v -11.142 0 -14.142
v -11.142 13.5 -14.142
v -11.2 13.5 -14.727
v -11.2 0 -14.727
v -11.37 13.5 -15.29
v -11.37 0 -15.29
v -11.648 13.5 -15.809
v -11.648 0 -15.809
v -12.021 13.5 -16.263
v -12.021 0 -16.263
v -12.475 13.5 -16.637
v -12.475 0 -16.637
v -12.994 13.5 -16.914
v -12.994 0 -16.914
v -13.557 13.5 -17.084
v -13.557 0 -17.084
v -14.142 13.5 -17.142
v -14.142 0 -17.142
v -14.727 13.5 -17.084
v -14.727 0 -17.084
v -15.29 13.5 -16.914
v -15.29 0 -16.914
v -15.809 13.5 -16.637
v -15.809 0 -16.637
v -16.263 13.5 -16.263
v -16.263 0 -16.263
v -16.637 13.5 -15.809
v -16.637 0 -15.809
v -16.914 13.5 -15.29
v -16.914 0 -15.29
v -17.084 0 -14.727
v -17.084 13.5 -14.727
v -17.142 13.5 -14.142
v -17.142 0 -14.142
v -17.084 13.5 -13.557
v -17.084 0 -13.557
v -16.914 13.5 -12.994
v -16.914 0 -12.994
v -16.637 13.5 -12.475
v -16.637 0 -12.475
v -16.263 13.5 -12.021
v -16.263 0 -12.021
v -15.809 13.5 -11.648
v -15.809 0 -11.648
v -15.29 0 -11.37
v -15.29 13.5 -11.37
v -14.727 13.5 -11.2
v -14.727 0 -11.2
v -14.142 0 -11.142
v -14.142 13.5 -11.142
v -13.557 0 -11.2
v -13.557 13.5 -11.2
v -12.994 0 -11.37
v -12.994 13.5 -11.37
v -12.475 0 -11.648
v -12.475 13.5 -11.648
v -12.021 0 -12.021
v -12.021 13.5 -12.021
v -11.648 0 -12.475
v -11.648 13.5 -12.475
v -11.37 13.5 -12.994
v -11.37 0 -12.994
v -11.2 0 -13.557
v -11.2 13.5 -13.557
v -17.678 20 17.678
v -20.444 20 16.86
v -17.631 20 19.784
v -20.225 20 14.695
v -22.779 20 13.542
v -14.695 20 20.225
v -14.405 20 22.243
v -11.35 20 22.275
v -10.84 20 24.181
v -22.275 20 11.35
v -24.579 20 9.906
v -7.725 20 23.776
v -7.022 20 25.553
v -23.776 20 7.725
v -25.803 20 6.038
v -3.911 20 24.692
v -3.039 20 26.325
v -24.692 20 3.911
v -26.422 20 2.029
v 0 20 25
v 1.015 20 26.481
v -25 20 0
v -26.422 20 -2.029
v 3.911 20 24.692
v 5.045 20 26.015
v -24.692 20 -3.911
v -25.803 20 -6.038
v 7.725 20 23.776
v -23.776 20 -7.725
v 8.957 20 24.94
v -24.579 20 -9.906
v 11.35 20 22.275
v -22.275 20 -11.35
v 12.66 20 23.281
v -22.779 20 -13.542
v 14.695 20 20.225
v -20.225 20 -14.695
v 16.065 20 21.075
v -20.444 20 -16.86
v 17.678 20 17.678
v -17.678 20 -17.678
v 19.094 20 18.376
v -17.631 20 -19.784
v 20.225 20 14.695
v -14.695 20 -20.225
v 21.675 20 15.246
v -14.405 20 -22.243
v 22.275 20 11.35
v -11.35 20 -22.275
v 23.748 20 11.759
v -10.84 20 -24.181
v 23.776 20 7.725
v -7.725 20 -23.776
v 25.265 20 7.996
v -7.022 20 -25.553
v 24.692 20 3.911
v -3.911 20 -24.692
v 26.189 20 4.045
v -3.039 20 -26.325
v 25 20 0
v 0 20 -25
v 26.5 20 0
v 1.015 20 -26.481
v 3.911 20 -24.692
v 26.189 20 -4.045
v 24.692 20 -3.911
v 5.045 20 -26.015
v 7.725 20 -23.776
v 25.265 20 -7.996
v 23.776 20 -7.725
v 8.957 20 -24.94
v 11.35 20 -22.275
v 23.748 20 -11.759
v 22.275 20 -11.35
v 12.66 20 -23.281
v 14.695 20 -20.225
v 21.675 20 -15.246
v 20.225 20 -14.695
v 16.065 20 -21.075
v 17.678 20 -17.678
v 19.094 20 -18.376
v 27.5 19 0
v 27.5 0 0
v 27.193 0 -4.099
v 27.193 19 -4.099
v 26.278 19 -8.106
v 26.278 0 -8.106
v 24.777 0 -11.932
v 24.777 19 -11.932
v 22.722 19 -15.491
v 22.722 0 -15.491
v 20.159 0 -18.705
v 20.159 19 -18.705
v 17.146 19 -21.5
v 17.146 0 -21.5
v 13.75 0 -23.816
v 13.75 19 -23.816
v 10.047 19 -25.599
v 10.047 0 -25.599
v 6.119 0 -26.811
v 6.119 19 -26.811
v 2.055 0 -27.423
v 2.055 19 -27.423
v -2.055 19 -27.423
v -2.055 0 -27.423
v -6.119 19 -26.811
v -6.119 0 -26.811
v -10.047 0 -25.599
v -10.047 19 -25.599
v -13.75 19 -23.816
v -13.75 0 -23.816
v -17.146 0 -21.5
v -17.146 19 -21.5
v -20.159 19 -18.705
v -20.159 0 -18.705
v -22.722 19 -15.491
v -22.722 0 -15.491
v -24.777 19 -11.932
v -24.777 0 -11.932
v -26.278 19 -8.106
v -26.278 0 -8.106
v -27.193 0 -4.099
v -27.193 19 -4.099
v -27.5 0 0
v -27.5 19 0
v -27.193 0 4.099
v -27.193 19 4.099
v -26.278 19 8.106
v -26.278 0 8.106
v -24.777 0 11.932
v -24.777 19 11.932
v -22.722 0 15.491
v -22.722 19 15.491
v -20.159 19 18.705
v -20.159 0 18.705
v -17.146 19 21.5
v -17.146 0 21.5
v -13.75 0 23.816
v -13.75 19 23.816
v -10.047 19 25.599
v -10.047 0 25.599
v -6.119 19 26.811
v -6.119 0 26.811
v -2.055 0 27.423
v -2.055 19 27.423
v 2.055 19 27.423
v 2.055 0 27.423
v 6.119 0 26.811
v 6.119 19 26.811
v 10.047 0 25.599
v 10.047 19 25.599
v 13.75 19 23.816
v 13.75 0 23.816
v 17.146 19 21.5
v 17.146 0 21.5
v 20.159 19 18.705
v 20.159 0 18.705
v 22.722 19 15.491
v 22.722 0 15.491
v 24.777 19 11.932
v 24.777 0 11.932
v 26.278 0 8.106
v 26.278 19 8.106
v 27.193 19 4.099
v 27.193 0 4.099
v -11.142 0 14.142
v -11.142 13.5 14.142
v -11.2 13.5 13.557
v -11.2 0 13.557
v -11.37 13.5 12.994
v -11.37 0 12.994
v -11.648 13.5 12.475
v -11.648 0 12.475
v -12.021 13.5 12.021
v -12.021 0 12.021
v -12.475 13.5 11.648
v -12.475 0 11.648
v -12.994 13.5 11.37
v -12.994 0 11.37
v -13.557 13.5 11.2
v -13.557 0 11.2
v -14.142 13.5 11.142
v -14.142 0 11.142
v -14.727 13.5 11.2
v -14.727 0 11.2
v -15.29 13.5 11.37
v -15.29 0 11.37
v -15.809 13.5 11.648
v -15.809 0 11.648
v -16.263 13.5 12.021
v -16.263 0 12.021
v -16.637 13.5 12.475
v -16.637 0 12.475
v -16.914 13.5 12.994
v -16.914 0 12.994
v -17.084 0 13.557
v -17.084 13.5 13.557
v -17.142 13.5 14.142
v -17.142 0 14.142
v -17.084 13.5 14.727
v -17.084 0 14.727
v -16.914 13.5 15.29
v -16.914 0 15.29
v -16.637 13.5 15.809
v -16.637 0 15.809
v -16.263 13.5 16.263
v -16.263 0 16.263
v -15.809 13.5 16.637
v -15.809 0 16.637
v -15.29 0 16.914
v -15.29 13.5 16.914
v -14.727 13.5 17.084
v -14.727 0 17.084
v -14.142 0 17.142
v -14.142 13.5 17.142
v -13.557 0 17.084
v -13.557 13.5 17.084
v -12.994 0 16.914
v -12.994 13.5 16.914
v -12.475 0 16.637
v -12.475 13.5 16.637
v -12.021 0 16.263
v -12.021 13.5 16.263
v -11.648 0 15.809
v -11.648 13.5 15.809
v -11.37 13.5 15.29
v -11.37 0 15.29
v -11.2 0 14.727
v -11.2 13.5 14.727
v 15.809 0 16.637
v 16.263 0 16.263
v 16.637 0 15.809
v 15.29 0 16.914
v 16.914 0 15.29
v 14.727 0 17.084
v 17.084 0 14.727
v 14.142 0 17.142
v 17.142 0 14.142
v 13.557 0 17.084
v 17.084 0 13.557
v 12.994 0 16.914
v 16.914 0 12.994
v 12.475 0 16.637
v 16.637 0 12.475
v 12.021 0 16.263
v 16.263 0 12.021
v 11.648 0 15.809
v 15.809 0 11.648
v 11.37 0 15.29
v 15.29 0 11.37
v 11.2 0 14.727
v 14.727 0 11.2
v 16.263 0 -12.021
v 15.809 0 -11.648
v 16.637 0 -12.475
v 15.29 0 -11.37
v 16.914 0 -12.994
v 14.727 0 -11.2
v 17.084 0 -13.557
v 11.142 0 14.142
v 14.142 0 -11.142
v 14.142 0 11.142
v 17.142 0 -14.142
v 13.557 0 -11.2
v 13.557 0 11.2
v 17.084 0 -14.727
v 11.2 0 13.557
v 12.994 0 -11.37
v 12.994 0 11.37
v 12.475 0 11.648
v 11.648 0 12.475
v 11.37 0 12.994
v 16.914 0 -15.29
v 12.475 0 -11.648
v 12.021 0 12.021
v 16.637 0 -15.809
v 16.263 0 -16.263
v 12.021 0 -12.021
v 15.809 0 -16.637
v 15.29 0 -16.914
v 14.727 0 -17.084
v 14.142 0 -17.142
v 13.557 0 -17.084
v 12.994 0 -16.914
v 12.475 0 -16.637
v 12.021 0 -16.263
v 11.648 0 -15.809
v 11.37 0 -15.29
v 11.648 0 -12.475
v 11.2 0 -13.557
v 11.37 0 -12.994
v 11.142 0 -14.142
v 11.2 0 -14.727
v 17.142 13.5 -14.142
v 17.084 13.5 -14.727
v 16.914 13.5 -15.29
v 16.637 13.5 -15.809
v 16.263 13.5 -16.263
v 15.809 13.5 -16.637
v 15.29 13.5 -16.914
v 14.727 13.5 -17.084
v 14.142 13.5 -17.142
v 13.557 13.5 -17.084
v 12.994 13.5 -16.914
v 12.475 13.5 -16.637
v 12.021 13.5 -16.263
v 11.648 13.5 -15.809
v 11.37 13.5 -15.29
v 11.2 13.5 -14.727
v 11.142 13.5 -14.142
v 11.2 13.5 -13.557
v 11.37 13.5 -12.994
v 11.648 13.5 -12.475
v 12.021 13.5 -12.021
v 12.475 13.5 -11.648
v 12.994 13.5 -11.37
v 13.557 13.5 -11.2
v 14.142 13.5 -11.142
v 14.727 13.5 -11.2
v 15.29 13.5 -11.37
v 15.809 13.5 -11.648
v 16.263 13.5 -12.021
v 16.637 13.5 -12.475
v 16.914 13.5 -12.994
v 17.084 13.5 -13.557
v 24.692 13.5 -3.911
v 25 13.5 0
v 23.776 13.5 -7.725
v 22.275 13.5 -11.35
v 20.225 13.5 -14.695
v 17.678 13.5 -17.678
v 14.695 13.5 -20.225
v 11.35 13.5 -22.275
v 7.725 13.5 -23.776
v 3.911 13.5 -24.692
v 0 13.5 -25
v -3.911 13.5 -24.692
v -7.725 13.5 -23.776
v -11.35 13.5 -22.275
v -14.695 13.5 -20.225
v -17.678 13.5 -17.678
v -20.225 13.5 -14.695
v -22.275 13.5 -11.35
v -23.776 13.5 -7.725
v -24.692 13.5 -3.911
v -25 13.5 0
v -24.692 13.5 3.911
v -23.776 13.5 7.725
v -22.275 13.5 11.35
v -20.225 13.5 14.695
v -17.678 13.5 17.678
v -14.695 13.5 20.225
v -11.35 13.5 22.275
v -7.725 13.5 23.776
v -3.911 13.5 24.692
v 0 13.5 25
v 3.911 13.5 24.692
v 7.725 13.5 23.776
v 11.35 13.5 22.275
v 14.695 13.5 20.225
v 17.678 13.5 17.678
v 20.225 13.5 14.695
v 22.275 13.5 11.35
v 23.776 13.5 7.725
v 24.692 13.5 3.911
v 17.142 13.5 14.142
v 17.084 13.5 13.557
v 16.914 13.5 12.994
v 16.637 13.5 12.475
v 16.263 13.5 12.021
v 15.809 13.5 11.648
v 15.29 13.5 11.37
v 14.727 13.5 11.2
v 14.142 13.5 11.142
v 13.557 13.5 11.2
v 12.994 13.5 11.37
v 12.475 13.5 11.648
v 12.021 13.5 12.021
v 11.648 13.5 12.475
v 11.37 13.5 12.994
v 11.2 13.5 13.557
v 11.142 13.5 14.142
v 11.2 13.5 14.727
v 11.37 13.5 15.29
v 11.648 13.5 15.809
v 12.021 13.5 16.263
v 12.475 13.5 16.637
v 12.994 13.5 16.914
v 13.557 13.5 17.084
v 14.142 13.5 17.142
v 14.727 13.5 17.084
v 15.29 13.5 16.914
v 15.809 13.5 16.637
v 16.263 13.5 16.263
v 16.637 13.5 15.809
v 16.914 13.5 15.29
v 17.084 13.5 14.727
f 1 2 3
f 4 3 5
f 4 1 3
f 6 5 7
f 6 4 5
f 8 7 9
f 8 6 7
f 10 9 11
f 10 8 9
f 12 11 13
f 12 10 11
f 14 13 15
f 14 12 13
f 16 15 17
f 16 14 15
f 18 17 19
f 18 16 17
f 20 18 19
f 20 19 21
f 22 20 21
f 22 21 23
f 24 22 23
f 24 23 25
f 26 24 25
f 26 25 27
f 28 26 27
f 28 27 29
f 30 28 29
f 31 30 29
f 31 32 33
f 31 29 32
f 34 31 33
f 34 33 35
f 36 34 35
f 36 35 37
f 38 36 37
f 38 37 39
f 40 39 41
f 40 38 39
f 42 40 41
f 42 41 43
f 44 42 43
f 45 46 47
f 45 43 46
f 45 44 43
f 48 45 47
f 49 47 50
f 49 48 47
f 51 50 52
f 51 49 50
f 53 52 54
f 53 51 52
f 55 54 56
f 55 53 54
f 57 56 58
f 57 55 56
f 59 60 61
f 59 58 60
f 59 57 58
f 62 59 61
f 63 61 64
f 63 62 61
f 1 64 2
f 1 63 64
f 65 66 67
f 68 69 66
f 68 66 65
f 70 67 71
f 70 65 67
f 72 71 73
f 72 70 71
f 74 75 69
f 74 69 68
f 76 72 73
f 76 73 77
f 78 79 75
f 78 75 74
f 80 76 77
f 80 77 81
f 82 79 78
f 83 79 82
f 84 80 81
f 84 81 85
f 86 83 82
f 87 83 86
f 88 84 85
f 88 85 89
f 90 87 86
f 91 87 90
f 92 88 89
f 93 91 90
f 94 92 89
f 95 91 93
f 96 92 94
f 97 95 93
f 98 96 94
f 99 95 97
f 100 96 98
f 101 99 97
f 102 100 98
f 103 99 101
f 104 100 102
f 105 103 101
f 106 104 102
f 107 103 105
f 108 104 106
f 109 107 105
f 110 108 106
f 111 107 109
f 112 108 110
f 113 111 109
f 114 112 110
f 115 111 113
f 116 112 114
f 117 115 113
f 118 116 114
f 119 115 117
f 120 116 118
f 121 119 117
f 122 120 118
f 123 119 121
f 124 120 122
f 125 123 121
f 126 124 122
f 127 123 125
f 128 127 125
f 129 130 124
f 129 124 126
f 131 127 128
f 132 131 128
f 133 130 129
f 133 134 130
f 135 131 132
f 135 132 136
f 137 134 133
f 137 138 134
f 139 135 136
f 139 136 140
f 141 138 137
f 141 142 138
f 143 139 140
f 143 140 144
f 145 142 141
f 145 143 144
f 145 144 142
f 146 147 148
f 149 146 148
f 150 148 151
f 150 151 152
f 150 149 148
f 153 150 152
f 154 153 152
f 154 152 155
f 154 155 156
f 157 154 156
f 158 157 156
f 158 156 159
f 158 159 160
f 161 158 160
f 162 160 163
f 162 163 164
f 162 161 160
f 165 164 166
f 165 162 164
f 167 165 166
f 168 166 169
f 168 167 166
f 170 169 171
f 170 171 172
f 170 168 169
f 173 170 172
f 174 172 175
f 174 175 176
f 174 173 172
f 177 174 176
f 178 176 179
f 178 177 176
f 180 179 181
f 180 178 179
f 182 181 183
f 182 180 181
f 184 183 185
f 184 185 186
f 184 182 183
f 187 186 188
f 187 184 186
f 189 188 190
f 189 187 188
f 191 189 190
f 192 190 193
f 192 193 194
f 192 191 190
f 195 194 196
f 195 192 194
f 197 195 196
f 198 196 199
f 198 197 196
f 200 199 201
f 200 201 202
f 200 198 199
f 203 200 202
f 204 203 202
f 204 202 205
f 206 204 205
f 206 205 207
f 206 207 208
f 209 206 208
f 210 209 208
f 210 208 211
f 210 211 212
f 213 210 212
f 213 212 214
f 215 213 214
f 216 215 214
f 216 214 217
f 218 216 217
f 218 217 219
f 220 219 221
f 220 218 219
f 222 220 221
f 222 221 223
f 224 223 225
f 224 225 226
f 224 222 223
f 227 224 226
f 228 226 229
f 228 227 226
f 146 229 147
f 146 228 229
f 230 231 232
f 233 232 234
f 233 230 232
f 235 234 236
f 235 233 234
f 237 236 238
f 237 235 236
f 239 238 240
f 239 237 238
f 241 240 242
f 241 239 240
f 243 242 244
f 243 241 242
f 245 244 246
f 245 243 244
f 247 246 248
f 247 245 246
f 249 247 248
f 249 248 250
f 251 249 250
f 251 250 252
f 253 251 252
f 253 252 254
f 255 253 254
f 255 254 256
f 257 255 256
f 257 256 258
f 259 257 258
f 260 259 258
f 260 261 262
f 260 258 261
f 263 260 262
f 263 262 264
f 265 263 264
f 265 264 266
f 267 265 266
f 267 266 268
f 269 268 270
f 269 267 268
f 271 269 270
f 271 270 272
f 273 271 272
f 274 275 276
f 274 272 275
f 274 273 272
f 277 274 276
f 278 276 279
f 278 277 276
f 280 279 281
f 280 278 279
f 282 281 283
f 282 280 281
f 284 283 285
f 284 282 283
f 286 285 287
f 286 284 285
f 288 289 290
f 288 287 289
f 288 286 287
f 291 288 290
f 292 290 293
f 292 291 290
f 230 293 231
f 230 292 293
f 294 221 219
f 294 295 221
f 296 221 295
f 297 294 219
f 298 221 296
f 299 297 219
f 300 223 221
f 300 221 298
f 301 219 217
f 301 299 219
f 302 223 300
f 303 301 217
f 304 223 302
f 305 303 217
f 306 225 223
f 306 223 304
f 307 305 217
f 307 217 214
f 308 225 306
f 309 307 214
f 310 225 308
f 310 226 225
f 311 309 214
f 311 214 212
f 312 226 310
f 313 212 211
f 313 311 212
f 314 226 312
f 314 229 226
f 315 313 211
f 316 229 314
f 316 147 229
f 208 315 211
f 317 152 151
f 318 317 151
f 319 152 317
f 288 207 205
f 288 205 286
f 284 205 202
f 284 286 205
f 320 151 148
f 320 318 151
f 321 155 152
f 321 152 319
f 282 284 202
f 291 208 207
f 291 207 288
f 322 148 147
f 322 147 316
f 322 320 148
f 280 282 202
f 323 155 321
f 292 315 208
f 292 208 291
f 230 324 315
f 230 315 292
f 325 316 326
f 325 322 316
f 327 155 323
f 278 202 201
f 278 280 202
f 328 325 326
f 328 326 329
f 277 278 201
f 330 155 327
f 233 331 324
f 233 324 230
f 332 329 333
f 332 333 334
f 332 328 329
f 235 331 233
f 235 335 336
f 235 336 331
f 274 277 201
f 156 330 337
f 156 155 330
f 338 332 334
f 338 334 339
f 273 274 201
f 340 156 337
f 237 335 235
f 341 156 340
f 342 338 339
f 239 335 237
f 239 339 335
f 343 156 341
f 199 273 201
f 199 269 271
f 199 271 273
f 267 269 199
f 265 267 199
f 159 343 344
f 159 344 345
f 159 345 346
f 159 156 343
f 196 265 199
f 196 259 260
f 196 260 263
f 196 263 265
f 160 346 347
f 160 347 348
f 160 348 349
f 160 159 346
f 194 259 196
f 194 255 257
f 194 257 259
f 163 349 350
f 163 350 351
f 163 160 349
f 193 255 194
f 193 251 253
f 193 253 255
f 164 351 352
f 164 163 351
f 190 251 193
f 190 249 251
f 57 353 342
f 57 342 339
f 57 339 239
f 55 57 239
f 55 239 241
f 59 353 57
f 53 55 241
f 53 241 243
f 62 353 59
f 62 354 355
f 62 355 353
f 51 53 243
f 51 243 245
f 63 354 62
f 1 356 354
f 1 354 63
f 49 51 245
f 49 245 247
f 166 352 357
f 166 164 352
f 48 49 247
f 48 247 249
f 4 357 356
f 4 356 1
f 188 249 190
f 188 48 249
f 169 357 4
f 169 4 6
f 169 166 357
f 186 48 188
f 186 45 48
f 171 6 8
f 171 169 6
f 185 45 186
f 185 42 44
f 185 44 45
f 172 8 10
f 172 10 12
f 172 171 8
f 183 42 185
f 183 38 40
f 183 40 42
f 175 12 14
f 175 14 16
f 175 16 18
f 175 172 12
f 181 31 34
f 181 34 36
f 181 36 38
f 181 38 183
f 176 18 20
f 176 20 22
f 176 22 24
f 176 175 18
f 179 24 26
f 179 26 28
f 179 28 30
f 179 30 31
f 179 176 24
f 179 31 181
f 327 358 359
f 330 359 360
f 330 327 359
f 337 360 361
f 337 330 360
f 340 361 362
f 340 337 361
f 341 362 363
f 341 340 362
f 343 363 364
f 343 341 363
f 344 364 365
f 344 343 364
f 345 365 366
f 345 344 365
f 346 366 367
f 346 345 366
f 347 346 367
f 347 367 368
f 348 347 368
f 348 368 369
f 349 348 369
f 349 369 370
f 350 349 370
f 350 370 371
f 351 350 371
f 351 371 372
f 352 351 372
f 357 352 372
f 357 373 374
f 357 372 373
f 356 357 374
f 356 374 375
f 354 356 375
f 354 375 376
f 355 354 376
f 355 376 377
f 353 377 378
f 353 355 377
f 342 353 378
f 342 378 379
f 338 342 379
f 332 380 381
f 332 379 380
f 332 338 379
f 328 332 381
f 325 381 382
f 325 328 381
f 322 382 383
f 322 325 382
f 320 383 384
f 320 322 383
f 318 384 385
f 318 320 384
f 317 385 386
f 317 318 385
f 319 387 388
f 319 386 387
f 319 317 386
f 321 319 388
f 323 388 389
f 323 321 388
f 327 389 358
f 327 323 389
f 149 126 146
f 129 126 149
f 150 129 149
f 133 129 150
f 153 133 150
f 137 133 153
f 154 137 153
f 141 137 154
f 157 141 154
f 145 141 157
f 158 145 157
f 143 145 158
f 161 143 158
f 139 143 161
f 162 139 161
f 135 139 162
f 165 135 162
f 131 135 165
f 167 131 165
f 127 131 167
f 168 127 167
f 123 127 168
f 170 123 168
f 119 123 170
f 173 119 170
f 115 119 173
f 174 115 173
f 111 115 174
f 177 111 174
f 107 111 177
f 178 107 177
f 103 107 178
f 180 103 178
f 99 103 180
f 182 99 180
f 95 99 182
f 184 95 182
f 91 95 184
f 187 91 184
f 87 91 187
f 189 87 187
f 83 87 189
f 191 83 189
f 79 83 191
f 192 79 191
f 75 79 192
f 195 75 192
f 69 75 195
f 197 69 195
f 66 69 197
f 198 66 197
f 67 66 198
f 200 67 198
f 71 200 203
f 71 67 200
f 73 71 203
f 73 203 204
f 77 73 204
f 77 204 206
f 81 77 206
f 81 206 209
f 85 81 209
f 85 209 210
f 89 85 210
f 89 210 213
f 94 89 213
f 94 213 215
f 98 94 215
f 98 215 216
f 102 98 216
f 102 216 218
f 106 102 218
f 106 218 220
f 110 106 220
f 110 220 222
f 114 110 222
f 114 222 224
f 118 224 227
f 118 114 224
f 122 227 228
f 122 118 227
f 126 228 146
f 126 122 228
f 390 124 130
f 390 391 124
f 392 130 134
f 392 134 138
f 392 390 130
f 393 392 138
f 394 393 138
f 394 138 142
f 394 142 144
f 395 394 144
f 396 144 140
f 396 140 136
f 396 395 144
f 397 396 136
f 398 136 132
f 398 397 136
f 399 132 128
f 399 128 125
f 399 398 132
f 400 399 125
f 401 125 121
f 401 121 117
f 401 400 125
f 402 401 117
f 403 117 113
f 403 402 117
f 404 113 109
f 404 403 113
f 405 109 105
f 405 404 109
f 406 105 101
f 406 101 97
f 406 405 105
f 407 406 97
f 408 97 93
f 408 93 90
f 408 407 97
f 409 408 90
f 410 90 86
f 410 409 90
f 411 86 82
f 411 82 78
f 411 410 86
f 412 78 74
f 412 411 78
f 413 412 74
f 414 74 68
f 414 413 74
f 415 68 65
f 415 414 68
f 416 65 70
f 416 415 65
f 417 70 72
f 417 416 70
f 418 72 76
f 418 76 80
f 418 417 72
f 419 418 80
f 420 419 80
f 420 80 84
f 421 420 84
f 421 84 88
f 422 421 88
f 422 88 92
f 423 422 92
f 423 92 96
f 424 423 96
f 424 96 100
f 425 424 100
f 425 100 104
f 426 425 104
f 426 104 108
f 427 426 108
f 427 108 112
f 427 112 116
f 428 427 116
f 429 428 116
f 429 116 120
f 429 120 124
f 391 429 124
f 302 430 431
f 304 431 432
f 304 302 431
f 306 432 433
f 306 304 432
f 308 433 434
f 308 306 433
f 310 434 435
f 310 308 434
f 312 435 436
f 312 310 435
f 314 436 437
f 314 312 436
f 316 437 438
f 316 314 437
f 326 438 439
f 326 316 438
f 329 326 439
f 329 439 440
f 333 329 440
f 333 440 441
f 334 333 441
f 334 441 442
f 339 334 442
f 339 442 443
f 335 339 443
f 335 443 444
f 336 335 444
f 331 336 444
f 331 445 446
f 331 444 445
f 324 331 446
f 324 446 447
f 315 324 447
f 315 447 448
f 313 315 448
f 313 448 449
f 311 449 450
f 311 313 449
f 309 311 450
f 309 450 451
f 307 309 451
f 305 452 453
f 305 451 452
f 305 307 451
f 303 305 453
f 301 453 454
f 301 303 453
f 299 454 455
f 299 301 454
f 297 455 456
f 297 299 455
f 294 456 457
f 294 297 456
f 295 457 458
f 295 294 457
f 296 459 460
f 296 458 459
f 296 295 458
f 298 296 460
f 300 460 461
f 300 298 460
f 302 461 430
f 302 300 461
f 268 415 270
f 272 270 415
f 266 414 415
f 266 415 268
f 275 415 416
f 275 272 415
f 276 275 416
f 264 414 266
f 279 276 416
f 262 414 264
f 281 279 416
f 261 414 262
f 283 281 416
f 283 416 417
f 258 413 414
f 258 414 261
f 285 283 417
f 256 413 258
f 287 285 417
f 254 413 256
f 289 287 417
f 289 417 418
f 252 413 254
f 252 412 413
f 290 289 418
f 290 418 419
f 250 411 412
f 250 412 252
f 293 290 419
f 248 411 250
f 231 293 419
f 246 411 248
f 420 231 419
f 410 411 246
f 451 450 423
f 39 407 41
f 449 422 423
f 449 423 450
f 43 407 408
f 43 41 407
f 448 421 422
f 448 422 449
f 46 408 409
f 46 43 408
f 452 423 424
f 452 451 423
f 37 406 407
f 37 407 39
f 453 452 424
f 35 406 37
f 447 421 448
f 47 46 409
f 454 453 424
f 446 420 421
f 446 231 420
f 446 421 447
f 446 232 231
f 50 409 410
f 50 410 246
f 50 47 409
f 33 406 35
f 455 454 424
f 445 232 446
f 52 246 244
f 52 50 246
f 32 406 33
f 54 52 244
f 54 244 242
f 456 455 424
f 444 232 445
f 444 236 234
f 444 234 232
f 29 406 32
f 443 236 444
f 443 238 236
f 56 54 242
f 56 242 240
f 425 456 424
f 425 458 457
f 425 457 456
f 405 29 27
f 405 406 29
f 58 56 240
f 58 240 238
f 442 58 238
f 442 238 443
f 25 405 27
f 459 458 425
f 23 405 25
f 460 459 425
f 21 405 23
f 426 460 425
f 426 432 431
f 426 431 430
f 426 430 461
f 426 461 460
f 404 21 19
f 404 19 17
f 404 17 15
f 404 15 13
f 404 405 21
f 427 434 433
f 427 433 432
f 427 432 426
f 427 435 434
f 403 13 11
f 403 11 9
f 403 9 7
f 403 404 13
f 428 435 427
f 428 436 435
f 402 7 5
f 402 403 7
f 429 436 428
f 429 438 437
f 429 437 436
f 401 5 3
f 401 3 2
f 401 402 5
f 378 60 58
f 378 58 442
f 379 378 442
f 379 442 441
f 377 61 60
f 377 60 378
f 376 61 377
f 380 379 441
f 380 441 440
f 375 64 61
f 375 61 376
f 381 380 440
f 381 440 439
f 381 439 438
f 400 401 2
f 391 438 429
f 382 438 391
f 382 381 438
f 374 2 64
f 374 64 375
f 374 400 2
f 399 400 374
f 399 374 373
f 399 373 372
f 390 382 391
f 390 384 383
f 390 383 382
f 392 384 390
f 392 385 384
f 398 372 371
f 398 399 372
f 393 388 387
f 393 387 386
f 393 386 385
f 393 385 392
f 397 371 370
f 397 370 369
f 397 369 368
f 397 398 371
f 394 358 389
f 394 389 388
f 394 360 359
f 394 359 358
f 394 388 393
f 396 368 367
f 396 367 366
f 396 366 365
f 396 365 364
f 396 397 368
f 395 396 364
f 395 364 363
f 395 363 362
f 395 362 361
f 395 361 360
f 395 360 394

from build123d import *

# Parameters (mm, degrees)
SKETCH2_R               = 3
CUT_EXTRUDE2_DEPTH      = 21
CUT_EXTRUDE2_DEPTH_BACK = 1
CHAMFER1_SIZE           = 1


with BuildPart() as part:
    # Sketch1 → Revolve1 (revolve)
    with BuildSketch(Plane.XY):
        Polygon((27.5, 0), (27.5, 20), (25, 20), (25, 13.5), (0, 13.5), (0, 0), align=None)
    revolve(axis=Axis((0, -626.687351978, 0), (0, 1, 0)))

    # Sketch2 → Cut-Extrude2 (cut, two sides)
    with BuildSketch(Plane(origin=(0, 0, 0), x_dir=(1, 0, 0), z_dir=(0, 1, 0))) as cut_extrude2_sk:
        with Locations((-14.142135624, 14.142135624)):
            Circle(SKETCH2_R)
        with Locations((14.142135624, 14.142135624)):
            Circle(SKETCH2_R)
        with Locations((14.142135624, -14.142135624)):
            Circle(SKETCH2_R)
        with Locations((-14.142135624, -14.142135624)):
            Circle(SKETCH2_R)
    extrude(amount=CUT_EXTRUDE2_DEPTH, mode=Mode.SUBTRACT)
    extrude(cut_extrude2_sk.sketch, amount=-CUT_EXTRUDE2_DEPTH_BACK, mode=Mode.SUBTRACT)

    # Chamfer1
    chamfer1_edges = [part.edges().sort_by_distance(p)[0] for p in [
        (-27.5, 20, 0),
    ]]
    chamfer(chamfer1_edges, length=CHAMFER1_SIZE)


solid = part.part
